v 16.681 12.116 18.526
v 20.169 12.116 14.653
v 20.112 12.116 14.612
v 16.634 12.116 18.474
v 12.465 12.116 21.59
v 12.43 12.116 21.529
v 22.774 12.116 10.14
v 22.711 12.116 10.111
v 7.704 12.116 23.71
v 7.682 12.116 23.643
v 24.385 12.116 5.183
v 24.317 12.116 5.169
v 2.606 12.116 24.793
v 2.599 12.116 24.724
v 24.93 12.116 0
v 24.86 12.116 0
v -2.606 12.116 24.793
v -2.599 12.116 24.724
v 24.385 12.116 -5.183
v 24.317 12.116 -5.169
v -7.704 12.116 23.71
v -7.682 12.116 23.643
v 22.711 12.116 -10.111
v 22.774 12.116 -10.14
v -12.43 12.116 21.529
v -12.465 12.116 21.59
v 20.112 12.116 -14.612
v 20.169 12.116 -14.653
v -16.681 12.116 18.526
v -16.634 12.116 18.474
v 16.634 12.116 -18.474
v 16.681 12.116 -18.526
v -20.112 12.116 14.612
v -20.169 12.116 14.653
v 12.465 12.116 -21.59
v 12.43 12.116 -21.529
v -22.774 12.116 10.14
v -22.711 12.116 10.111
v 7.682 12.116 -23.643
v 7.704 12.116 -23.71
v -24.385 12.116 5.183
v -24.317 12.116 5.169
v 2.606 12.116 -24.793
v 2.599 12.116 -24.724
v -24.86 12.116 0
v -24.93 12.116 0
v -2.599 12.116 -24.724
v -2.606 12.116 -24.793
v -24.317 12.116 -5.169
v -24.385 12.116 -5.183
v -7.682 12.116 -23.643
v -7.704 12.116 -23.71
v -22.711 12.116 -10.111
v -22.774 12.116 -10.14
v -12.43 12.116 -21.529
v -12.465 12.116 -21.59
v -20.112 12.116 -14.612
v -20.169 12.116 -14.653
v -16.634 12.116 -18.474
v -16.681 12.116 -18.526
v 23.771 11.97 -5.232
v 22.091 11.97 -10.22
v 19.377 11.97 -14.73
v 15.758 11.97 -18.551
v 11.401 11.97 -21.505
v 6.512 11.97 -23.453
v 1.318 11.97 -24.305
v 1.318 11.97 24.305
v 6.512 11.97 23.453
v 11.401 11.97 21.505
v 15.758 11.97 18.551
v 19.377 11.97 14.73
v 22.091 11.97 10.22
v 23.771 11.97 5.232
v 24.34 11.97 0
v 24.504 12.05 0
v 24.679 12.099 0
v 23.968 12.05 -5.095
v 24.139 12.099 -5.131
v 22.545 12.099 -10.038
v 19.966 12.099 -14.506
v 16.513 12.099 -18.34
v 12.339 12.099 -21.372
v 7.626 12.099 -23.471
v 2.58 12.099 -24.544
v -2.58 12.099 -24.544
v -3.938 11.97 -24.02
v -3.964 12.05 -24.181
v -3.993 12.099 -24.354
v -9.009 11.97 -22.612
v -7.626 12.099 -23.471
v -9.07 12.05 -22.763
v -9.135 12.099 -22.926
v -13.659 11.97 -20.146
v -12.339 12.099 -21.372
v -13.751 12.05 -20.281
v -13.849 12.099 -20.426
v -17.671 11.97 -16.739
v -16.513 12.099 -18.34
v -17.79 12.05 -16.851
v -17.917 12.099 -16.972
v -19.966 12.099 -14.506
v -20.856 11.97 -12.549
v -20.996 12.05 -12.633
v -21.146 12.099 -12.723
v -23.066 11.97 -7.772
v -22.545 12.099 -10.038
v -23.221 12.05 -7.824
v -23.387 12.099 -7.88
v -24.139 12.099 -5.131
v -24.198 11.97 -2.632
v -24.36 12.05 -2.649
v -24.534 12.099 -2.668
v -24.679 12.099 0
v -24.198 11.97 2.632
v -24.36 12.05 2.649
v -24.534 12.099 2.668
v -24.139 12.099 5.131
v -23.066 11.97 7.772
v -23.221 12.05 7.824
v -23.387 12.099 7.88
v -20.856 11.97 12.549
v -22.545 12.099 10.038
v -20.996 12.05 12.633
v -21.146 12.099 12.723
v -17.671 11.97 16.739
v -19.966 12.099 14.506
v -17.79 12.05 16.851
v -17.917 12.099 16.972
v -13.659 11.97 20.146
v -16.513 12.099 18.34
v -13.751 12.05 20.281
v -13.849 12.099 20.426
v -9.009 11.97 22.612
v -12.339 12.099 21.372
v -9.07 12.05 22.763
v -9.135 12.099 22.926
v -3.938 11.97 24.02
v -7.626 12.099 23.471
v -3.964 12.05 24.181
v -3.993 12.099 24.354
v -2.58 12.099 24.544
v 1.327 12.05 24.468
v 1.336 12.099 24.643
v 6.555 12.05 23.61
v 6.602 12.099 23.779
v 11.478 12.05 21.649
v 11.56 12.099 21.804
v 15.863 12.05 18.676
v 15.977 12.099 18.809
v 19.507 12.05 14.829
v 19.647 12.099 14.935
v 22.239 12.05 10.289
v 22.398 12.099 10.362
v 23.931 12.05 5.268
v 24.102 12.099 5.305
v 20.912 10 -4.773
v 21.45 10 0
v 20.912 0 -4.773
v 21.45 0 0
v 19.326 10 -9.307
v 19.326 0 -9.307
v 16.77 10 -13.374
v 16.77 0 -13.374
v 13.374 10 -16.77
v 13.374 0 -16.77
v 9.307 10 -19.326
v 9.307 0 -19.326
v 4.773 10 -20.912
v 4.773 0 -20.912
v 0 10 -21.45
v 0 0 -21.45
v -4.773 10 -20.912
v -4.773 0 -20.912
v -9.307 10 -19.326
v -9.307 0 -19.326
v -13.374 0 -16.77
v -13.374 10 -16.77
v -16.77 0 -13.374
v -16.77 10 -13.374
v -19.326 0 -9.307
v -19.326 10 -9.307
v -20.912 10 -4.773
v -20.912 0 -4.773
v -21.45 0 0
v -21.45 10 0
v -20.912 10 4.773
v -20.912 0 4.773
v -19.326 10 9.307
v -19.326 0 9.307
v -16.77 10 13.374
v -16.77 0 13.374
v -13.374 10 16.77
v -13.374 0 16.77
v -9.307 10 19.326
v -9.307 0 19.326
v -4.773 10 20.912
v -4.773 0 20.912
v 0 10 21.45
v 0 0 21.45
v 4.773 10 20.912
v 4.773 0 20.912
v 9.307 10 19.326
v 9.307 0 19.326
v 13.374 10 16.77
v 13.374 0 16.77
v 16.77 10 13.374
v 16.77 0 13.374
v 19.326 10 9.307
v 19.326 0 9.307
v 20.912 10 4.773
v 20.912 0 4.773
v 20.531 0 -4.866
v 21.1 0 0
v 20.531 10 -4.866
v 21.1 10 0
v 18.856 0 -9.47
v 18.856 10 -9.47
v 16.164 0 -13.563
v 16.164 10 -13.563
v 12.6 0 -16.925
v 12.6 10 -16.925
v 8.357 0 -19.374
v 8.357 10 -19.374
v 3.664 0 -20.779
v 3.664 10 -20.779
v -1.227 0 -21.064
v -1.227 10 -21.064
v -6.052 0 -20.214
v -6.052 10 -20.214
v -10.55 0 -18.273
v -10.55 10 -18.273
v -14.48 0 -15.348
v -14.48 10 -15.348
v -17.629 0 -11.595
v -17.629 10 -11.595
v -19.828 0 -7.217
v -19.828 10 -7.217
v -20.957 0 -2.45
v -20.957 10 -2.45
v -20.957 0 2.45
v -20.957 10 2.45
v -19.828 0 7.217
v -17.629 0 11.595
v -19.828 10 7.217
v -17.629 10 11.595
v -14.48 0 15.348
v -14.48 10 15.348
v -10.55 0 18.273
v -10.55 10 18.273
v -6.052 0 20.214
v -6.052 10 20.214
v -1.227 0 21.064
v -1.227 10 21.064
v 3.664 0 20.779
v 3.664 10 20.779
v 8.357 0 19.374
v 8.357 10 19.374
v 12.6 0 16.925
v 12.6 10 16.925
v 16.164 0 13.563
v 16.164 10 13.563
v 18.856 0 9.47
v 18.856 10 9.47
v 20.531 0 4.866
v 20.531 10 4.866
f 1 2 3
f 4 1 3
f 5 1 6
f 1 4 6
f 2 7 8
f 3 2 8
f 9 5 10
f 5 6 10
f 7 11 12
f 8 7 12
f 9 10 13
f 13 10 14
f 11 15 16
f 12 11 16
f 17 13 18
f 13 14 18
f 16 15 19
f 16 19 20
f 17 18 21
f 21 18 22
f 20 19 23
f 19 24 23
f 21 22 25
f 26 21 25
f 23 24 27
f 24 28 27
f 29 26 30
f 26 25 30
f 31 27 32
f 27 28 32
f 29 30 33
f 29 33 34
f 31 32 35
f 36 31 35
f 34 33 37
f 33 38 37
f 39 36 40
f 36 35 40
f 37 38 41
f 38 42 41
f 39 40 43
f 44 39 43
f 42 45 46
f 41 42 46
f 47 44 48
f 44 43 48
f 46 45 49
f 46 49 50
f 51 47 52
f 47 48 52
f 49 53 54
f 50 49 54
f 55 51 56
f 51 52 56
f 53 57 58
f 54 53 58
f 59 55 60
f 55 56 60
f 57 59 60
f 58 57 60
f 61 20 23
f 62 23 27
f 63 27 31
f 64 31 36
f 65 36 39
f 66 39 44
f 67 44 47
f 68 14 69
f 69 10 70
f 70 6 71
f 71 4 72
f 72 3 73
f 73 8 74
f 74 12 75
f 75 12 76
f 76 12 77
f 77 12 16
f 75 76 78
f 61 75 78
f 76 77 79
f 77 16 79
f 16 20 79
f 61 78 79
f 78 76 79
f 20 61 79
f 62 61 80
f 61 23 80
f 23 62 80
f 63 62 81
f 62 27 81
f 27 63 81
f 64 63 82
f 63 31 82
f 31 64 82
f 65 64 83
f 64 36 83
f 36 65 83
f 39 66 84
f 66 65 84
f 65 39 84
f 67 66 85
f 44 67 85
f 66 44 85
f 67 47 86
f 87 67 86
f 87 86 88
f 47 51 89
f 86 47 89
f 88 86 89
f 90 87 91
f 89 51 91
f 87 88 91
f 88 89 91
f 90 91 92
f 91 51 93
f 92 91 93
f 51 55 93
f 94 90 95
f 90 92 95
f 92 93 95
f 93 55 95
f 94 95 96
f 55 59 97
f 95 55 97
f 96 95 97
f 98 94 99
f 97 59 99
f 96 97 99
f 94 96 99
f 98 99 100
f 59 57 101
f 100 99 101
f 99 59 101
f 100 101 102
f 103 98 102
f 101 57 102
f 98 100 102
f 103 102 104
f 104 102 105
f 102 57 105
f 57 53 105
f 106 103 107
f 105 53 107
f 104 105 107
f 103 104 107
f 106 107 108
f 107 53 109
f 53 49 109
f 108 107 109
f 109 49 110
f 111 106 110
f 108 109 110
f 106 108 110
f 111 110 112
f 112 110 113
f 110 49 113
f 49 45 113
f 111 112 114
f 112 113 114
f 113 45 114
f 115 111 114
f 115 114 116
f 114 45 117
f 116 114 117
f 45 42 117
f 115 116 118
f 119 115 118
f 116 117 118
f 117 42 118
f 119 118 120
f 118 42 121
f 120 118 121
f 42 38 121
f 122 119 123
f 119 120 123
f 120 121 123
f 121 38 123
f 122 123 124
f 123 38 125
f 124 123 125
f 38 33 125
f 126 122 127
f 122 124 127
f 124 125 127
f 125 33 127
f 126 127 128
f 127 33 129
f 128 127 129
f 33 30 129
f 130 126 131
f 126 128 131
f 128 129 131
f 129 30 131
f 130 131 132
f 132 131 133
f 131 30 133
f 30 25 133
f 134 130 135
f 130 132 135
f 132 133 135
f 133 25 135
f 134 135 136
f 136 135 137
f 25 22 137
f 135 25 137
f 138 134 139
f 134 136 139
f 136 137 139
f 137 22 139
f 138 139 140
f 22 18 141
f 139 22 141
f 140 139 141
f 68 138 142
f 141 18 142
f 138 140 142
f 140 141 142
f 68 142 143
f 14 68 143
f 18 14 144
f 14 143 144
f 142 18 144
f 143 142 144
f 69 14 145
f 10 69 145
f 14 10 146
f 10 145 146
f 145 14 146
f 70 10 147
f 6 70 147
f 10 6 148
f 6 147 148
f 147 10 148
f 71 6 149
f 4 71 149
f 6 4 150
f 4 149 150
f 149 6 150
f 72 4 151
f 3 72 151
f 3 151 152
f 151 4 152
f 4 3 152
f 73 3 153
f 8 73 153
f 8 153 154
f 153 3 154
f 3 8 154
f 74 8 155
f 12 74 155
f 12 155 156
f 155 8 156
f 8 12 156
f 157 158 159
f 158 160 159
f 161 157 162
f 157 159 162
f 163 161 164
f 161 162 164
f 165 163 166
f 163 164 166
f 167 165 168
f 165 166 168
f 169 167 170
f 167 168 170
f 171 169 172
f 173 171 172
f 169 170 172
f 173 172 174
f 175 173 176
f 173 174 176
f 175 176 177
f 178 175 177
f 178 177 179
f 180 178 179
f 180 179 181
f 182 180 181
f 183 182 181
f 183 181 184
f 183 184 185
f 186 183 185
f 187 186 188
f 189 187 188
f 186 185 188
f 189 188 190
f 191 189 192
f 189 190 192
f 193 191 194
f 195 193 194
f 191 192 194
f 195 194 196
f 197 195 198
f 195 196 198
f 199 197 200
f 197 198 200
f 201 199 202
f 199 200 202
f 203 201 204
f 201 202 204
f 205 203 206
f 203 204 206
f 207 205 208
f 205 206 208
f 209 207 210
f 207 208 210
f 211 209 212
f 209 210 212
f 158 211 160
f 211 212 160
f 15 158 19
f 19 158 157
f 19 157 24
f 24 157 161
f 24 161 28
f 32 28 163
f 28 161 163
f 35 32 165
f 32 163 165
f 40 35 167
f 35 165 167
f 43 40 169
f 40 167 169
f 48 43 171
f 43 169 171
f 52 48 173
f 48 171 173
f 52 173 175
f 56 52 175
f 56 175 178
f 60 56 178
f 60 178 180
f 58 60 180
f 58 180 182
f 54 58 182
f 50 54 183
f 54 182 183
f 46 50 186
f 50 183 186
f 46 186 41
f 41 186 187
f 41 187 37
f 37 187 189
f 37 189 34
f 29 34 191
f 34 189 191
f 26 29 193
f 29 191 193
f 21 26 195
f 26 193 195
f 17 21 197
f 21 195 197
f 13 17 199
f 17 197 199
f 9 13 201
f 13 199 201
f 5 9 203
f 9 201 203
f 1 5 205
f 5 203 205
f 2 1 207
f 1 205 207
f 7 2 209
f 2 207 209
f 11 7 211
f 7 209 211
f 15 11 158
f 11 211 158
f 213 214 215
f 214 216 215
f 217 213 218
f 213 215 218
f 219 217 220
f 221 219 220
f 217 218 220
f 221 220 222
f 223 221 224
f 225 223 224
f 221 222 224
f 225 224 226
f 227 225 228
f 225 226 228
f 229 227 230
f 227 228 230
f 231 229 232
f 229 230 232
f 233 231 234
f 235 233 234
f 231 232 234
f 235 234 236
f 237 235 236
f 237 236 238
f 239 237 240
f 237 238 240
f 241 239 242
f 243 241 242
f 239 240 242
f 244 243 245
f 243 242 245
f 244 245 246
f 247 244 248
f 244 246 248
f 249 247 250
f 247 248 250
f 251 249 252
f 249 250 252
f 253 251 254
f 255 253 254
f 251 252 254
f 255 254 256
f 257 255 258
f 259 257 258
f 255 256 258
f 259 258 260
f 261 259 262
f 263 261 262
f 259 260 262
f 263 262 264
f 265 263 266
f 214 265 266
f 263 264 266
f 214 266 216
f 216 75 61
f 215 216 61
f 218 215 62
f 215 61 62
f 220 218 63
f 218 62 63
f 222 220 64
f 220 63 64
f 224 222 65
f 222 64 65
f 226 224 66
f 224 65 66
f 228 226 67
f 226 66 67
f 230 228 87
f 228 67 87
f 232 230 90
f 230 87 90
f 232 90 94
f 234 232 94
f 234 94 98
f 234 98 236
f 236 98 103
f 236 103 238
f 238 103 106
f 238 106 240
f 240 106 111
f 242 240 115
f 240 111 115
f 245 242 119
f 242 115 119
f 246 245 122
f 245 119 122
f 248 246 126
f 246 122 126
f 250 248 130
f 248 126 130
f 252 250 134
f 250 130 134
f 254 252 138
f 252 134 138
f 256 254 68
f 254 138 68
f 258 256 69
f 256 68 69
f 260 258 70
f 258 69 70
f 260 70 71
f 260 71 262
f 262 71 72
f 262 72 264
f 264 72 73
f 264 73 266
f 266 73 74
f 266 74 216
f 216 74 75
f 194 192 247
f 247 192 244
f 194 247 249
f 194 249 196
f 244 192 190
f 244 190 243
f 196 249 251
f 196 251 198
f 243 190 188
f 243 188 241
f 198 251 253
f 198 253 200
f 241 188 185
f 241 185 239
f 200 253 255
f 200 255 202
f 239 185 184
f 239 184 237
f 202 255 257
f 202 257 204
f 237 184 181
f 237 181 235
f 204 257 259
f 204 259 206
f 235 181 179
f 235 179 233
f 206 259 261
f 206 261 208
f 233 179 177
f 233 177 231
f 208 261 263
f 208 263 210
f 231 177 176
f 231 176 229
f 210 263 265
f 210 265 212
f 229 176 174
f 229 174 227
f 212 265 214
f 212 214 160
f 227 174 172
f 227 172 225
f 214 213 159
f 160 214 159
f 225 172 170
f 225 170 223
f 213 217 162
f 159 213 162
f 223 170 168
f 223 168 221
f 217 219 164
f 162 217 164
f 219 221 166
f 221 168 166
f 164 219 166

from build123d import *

# Parameters (mm, degrees)
FILLET_R = 1


with BuildPart() as part:
    # Sketch → Revolution (revolve)
    with BuildSketch(Plane.XY):
        Polygon((21.1, 0), (21.1, 10), (24.57967, 12.115673), (24.92967, 12.115673), (21.45, 10), (21.45, 0), align=None)
    revolve(axis=Axis((0, 0, 0), (0, 1, 0)))

    # Fillet
    fillet_edges = [part.edges().sort_by_distance(p)[0] for p in [
        (-24.57967, 12.115673, 0),
    ]]
    fillet(fillet_edges, radius=FILLET_R)


solid = part.part
